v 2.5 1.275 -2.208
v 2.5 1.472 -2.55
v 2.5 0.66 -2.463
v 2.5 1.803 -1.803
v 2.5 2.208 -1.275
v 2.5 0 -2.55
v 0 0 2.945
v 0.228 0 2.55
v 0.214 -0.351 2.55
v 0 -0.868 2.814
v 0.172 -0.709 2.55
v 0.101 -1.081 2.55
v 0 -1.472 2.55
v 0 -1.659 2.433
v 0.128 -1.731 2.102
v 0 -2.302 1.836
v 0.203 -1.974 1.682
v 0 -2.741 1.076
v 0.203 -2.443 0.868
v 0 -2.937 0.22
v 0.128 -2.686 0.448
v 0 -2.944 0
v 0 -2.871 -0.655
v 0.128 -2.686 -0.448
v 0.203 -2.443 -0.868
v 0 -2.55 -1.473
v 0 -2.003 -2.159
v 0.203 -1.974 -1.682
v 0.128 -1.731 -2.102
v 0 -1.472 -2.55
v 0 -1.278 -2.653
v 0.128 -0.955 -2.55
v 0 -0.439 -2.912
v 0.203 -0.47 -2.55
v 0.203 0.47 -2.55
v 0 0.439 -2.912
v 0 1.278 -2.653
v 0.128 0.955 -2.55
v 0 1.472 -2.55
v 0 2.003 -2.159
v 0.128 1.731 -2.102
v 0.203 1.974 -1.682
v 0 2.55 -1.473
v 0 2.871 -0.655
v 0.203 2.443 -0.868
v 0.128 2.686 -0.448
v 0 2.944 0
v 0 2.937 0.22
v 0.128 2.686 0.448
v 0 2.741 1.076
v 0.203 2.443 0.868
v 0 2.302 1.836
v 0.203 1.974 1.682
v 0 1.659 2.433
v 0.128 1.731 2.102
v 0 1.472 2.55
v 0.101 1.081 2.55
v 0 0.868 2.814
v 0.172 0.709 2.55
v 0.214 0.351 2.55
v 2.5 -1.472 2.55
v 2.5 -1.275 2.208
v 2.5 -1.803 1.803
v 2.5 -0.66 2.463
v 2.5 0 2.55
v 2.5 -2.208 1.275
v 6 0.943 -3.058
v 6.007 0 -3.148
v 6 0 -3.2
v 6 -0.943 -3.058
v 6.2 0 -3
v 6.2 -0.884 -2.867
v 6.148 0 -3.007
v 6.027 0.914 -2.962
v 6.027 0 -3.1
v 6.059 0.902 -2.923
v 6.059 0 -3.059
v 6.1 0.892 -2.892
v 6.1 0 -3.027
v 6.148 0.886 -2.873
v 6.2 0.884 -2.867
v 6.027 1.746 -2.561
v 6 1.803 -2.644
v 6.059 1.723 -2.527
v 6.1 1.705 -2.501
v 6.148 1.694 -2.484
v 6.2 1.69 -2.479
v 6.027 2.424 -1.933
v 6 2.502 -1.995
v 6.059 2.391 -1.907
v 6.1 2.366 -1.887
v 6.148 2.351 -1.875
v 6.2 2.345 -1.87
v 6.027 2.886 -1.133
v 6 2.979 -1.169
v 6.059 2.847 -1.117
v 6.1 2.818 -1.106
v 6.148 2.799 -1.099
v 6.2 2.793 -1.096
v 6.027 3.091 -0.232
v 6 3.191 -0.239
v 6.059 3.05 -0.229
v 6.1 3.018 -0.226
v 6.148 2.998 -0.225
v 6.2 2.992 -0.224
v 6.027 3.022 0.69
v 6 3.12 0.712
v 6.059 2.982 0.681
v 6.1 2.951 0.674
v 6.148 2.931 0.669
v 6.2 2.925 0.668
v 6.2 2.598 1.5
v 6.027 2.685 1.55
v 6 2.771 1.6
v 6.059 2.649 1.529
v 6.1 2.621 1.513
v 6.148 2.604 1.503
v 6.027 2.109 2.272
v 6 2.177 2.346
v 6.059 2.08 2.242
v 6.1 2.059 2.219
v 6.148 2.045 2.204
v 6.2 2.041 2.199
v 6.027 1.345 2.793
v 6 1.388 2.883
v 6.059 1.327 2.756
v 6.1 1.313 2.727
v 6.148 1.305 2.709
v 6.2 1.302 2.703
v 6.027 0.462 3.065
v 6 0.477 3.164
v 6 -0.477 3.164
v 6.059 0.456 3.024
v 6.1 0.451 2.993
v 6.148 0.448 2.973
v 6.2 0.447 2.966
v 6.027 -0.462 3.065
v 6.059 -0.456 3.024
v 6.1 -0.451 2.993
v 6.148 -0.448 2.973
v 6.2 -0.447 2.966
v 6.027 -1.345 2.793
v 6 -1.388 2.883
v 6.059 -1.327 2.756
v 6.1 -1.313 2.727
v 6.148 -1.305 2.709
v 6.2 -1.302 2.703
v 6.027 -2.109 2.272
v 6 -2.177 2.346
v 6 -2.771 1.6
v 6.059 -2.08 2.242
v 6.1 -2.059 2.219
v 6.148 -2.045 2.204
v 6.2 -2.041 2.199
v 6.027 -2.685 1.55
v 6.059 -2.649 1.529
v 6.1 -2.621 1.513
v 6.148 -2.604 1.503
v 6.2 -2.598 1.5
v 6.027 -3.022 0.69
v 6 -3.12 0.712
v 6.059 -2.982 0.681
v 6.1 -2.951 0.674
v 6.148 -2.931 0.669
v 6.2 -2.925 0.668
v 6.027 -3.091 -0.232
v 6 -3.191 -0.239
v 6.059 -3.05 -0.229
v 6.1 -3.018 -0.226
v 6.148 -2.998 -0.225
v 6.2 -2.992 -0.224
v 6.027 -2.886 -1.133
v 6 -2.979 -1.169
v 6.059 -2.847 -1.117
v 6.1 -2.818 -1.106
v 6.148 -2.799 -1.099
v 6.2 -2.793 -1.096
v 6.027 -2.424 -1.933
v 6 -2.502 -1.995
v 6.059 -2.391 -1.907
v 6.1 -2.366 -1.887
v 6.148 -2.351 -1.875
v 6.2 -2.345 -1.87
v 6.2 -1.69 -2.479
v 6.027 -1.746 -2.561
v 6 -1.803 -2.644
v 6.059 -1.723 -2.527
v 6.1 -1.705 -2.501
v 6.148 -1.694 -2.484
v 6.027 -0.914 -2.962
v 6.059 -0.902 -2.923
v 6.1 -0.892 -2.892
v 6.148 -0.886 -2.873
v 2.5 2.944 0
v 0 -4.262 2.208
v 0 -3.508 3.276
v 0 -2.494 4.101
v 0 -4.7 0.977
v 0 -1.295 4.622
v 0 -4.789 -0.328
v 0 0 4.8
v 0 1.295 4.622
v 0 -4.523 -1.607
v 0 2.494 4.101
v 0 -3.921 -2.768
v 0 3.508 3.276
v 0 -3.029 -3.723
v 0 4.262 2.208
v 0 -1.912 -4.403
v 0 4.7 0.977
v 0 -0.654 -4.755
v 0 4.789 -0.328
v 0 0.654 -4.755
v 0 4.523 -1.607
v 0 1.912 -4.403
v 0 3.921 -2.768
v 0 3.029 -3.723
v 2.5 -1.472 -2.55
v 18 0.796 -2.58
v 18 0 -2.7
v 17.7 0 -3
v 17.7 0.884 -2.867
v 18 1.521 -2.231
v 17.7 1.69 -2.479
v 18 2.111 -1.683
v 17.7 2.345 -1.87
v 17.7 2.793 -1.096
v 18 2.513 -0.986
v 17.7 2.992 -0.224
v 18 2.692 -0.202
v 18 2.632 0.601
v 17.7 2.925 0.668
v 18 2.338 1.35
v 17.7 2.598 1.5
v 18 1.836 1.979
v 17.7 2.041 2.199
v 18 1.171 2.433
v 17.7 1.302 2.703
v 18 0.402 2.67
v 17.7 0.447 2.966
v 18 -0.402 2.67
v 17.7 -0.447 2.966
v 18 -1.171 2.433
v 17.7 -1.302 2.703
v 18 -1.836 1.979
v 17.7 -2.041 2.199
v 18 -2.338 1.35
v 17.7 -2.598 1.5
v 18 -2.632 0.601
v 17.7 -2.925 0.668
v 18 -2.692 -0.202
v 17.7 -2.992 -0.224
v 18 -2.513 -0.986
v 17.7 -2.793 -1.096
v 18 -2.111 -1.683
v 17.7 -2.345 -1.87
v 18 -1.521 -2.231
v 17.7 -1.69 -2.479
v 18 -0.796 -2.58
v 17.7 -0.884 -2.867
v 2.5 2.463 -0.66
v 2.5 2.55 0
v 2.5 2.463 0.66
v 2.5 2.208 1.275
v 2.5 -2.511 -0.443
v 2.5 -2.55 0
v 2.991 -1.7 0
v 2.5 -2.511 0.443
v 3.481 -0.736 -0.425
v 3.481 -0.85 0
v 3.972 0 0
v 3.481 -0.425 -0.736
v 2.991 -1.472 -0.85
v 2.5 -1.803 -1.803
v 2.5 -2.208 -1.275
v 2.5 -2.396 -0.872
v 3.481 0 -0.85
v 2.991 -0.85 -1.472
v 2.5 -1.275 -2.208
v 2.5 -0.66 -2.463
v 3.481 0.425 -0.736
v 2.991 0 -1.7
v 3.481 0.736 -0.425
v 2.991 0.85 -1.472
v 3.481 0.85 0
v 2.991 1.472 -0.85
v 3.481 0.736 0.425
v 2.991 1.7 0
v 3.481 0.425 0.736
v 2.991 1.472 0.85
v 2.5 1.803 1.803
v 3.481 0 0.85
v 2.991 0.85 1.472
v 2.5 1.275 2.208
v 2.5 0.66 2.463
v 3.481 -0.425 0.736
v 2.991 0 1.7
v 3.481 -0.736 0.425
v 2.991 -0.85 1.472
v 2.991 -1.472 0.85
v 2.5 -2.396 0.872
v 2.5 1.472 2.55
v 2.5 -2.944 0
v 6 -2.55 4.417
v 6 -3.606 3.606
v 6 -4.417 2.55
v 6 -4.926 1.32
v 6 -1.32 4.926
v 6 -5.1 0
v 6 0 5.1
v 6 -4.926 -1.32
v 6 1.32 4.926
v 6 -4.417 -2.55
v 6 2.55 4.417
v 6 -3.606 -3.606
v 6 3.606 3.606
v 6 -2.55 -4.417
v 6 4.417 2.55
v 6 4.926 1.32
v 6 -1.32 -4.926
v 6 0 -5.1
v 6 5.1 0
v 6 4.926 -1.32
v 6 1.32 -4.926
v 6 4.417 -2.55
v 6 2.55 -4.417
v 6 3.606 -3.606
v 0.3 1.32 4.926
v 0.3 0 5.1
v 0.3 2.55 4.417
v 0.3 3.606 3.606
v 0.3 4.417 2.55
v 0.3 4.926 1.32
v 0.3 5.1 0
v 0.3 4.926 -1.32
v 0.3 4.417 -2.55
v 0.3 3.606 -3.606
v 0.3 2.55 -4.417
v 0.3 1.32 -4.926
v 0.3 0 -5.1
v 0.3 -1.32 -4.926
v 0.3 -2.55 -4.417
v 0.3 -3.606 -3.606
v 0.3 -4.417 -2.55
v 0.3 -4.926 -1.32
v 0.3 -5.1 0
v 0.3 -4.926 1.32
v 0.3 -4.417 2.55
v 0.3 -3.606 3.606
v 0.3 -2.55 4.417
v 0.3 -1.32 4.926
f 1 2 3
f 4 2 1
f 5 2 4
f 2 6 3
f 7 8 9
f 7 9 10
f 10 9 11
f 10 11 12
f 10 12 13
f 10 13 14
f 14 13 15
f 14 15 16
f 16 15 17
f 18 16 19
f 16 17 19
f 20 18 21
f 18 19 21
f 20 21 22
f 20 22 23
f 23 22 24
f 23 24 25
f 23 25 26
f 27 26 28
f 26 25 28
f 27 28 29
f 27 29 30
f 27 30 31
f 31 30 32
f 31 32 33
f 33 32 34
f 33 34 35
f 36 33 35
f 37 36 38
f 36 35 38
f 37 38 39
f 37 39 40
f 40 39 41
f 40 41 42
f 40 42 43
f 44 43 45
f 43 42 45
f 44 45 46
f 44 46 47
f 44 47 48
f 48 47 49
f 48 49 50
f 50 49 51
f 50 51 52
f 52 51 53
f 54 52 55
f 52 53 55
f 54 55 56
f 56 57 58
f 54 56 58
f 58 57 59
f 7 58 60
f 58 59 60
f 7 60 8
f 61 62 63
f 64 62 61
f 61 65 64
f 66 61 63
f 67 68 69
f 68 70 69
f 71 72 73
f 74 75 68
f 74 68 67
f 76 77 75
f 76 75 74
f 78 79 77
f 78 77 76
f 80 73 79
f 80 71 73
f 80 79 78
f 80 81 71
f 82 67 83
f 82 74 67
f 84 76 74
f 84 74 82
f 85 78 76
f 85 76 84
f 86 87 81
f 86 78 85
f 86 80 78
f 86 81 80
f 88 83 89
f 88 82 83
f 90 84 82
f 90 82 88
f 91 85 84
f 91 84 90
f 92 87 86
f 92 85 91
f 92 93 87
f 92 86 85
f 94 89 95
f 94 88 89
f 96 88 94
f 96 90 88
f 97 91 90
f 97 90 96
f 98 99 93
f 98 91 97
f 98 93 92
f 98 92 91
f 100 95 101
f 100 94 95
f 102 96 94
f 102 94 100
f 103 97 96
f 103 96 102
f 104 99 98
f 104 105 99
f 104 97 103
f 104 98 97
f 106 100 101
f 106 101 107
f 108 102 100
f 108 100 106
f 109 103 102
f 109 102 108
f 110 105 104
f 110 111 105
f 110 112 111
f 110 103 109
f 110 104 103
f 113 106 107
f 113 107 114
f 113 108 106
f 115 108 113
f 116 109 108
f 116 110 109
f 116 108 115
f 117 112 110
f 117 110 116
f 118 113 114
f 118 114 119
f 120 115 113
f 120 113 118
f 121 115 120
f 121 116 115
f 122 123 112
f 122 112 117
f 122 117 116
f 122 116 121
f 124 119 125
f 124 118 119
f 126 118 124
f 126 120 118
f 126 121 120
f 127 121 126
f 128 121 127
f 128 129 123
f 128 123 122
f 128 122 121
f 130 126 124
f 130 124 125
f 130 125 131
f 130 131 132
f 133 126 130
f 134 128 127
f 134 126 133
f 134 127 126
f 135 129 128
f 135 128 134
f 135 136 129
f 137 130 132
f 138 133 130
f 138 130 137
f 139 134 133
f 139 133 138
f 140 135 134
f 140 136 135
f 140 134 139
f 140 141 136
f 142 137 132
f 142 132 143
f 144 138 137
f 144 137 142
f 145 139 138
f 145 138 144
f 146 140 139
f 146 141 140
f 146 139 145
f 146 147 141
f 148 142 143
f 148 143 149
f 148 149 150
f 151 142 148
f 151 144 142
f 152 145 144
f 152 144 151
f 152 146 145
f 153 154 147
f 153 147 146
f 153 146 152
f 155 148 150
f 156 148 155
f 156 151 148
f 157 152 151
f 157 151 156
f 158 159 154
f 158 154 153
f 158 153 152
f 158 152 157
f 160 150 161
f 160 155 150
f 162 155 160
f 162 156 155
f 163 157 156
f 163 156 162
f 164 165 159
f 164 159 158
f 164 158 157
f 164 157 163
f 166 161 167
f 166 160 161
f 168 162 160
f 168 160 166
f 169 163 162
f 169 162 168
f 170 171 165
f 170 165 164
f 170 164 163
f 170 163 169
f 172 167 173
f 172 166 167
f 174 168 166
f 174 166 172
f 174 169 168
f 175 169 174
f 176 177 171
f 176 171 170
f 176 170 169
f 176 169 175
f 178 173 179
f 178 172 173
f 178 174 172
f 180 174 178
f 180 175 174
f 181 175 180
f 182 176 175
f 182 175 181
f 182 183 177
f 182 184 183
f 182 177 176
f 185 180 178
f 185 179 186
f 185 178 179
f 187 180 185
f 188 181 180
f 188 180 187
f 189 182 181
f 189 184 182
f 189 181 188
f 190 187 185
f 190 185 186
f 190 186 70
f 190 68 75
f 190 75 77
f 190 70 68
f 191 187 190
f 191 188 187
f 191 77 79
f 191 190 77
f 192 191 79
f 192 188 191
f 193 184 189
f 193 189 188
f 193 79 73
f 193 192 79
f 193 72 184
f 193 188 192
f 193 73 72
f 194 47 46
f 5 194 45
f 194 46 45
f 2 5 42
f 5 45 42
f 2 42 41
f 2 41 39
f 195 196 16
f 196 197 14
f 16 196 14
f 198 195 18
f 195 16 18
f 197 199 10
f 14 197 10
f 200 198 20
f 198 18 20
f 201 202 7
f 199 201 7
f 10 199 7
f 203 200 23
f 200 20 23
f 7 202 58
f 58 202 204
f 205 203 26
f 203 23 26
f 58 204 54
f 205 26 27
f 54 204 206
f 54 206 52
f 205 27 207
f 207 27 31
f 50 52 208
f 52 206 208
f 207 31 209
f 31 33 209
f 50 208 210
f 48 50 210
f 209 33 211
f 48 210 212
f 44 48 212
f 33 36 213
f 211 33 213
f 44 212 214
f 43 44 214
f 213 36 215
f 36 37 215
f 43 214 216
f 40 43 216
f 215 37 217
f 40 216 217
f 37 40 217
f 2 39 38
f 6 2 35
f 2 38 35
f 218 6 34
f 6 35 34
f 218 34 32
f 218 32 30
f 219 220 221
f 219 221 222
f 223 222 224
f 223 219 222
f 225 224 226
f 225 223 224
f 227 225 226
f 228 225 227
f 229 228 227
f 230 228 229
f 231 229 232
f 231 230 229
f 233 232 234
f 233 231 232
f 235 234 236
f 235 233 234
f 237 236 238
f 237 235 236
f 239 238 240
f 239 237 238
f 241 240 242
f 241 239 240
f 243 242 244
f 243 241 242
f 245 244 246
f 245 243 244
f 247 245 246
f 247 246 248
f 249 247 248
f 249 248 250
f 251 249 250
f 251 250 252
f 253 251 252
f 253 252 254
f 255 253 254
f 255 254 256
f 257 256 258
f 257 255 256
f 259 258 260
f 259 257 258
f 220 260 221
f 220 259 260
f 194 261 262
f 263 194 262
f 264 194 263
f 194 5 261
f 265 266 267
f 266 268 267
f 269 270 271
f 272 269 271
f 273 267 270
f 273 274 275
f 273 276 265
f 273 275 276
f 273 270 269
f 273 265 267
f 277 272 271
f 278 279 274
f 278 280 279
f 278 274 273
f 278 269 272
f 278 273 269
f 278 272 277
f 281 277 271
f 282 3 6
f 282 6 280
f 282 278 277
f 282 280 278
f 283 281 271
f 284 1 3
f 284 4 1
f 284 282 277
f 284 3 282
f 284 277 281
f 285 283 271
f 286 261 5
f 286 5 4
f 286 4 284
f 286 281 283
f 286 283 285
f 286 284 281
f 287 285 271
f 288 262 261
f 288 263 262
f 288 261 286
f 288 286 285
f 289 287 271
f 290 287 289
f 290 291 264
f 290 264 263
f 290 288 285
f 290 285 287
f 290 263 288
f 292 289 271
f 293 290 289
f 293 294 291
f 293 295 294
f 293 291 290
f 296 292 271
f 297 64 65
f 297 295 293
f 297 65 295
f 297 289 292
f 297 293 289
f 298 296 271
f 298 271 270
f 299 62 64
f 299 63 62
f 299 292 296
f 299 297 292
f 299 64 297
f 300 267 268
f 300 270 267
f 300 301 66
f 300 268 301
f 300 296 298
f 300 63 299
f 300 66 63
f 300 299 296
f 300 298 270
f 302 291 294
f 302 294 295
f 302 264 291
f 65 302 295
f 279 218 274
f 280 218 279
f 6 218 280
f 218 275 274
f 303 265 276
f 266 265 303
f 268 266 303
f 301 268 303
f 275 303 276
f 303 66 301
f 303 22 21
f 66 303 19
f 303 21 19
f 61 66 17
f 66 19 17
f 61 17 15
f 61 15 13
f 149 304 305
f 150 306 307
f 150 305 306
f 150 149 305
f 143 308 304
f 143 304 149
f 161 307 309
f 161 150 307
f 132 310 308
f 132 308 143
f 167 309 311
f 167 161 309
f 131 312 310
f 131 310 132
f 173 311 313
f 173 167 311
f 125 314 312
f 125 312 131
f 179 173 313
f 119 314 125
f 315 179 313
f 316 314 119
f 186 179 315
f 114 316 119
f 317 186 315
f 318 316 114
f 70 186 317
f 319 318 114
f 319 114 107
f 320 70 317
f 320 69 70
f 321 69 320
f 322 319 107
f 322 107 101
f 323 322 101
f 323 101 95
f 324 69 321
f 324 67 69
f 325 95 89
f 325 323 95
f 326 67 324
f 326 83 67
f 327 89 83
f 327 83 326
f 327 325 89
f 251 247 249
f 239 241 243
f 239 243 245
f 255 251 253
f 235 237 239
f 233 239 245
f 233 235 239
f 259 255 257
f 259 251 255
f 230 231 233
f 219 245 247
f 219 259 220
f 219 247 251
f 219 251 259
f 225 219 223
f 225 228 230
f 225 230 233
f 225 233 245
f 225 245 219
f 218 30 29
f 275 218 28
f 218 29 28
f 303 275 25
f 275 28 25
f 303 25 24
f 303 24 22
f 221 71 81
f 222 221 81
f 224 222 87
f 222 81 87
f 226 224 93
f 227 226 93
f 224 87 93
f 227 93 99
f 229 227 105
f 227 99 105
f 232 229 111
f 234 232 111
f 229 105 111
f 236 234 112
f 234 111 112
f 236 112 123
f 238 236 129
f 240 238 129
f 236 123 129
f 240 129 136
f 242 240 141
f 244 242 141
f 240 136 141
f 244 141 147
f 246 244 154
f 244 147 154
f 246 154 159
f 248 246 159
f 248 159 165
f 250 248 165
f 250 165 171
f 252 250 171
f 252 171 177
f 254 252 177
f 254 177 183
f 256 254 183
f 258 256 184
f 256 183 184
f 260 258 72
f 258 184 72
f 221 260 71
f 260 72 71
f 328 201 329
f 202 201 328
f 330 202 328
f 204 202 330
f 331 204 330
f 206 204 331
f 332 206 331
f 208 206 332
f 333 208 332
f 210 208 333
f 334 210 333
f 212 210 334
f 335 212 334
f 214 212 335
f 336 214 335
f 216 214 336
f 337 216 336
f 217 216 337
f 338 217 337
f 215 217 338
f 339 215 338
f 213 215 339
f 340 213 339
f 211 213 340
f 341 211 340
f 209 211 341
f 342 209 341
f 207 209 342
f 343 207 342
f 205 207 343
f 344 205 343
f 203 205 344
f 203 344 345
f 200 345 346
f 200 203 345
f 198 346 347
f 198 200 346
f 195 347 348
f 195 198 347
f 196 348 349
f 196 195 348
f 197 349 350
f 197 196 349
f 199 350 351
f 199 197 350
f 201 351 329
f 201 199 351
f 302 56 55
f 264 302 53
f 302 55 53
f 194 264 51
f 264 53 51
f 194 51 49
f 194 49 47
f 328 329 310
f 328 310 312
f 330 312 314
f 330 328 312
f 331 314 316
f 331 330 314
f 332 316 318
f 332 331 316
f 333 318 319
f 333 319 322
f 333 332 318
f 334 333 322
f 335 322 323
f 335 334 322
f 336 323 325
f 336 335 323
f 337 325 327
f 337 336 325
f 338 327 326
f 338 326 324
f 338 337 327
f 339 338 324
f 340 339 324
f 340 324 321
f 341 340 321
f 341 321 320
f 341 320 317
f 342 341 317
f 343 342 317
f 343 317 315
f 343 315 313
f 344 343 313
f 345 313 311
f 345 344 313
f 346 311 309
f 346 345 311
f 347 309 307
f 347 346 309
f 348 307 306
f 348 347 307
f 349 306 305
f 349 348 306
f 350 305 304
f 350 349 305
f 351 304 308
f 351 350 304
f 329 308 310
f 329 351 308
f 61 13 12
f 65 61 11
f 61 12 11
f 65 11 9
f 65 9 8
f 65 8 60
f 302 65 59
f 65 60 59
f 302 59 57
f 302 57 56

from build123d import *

# Parameters (mm, degrees)
ESBO_O1_W                = 6
ESBO_O1_H                = 5.1
ESBO_O2_R                = 3
RESSALTO_EXTRUS_O1_DEPTH = 12
CORTE_EXTRUS_O1_DEPTH    = 2.5
CHANFRO1_SIZE            = 0.3
FILETE1_R                = 0.2


with BuildPart() as part:
    # Esboço1 → Revolução1 (revolve)
    with BuildSketch(Plane(origin=(0, 0, 0), x_dir=(-1, 0, 0), z_dir=(0, 0, -1)), mode=Mode.PRIVATE) as revolu_o1_sk:
        with Locations((-3, 2.55)):
            Rectangle(ESBO_O1_W, ESBO_O1_H)
    revolve(revolu_o1_sk.sketch.rotate(Axis((6, 0, 0), (-1, 0, 0)), 270), axis=Axis((6, 0, 0), (-1, 0, 0)))

    # Esboço2 → Ressalto-extrusão1 (add)
    with BuildSketch(Plane(origin=(6, 0, 0), x_dir=(0, 0, -1), z_dir=(1, 0, 0))):
        Circle(ESBO_O2_R)
    extrude(amount=RESSALTO_EXTRUS_O1_DEPTH)

    # Esboço3 → Corte-extrusão1 (cut)
    with BuildSketch(Plane.ZY):
        Polygon((0, 2.944486373), (-2.55, 1.472243186), (-2.55, -1.472243186), (0, -2.944486373), (2.55, -1.472243186), (2.55, 1.472243186), align=None)
    extrude(amount=-CORTE_EXTRUS_O1_DEPTH, mode=Mode.SUBTRACT)

    # Esboço4 → Corte-Revolução1 (revolve, cut)
    with BuildSketch(Plane.XY, mode=Mode.PRIVATE) as corte_revolu_o1_sk:
        Polygon((2.5, 2.55), (2.5, 0), (3.972243186, 0), align=None)
    revolve(corte_revolu_o1_sk.sketch.rotate(Axis((2.5, 0, 0), (1, 0, 0)), 180), axis=Axis((2.5, 0, 0), (1, 0, 0)), mode=Mode.SUBTRACT)

    # Chanfro1
    chanfro1_edges = [part.edges().sort_by_distance(p)[0] for p in [
        (18, 0, 3),
        (0, 0, -5.1),
    ]]
    chamfer(chanfro1_edges, length=CHANFRO1_SIZE)

    # Filete1
    filete1_edges = [part.edges().sort_by_distance(p)[0] for p in [
        (6, 0, 3),
    ]]
    fillet(filete1_edges, radius=FILETE1_R)

    # Sketch1 → Cut-Revolve1 (revolve, cut)
    with BuildSketch(Plane(origin=(0, 0, 0), x_dir=(1, 0, 0), z_dir=(0, 1, 0)), mode=Mode.PRIVATE) as cut_revolve1_sk:
        Polygon((0, 2.945), (1.700296543, 0), (0, 0), align=None)
    revolve(cut_revolve1_sk.sketch.rotate(Axis((1.700296543, 0, 0), (1, 0, 0)), 180), axis=Axis((1.700296543, 0, 0), (1, 0, 0)), mode=Mode.SUBTRACT)


solid = part.part
